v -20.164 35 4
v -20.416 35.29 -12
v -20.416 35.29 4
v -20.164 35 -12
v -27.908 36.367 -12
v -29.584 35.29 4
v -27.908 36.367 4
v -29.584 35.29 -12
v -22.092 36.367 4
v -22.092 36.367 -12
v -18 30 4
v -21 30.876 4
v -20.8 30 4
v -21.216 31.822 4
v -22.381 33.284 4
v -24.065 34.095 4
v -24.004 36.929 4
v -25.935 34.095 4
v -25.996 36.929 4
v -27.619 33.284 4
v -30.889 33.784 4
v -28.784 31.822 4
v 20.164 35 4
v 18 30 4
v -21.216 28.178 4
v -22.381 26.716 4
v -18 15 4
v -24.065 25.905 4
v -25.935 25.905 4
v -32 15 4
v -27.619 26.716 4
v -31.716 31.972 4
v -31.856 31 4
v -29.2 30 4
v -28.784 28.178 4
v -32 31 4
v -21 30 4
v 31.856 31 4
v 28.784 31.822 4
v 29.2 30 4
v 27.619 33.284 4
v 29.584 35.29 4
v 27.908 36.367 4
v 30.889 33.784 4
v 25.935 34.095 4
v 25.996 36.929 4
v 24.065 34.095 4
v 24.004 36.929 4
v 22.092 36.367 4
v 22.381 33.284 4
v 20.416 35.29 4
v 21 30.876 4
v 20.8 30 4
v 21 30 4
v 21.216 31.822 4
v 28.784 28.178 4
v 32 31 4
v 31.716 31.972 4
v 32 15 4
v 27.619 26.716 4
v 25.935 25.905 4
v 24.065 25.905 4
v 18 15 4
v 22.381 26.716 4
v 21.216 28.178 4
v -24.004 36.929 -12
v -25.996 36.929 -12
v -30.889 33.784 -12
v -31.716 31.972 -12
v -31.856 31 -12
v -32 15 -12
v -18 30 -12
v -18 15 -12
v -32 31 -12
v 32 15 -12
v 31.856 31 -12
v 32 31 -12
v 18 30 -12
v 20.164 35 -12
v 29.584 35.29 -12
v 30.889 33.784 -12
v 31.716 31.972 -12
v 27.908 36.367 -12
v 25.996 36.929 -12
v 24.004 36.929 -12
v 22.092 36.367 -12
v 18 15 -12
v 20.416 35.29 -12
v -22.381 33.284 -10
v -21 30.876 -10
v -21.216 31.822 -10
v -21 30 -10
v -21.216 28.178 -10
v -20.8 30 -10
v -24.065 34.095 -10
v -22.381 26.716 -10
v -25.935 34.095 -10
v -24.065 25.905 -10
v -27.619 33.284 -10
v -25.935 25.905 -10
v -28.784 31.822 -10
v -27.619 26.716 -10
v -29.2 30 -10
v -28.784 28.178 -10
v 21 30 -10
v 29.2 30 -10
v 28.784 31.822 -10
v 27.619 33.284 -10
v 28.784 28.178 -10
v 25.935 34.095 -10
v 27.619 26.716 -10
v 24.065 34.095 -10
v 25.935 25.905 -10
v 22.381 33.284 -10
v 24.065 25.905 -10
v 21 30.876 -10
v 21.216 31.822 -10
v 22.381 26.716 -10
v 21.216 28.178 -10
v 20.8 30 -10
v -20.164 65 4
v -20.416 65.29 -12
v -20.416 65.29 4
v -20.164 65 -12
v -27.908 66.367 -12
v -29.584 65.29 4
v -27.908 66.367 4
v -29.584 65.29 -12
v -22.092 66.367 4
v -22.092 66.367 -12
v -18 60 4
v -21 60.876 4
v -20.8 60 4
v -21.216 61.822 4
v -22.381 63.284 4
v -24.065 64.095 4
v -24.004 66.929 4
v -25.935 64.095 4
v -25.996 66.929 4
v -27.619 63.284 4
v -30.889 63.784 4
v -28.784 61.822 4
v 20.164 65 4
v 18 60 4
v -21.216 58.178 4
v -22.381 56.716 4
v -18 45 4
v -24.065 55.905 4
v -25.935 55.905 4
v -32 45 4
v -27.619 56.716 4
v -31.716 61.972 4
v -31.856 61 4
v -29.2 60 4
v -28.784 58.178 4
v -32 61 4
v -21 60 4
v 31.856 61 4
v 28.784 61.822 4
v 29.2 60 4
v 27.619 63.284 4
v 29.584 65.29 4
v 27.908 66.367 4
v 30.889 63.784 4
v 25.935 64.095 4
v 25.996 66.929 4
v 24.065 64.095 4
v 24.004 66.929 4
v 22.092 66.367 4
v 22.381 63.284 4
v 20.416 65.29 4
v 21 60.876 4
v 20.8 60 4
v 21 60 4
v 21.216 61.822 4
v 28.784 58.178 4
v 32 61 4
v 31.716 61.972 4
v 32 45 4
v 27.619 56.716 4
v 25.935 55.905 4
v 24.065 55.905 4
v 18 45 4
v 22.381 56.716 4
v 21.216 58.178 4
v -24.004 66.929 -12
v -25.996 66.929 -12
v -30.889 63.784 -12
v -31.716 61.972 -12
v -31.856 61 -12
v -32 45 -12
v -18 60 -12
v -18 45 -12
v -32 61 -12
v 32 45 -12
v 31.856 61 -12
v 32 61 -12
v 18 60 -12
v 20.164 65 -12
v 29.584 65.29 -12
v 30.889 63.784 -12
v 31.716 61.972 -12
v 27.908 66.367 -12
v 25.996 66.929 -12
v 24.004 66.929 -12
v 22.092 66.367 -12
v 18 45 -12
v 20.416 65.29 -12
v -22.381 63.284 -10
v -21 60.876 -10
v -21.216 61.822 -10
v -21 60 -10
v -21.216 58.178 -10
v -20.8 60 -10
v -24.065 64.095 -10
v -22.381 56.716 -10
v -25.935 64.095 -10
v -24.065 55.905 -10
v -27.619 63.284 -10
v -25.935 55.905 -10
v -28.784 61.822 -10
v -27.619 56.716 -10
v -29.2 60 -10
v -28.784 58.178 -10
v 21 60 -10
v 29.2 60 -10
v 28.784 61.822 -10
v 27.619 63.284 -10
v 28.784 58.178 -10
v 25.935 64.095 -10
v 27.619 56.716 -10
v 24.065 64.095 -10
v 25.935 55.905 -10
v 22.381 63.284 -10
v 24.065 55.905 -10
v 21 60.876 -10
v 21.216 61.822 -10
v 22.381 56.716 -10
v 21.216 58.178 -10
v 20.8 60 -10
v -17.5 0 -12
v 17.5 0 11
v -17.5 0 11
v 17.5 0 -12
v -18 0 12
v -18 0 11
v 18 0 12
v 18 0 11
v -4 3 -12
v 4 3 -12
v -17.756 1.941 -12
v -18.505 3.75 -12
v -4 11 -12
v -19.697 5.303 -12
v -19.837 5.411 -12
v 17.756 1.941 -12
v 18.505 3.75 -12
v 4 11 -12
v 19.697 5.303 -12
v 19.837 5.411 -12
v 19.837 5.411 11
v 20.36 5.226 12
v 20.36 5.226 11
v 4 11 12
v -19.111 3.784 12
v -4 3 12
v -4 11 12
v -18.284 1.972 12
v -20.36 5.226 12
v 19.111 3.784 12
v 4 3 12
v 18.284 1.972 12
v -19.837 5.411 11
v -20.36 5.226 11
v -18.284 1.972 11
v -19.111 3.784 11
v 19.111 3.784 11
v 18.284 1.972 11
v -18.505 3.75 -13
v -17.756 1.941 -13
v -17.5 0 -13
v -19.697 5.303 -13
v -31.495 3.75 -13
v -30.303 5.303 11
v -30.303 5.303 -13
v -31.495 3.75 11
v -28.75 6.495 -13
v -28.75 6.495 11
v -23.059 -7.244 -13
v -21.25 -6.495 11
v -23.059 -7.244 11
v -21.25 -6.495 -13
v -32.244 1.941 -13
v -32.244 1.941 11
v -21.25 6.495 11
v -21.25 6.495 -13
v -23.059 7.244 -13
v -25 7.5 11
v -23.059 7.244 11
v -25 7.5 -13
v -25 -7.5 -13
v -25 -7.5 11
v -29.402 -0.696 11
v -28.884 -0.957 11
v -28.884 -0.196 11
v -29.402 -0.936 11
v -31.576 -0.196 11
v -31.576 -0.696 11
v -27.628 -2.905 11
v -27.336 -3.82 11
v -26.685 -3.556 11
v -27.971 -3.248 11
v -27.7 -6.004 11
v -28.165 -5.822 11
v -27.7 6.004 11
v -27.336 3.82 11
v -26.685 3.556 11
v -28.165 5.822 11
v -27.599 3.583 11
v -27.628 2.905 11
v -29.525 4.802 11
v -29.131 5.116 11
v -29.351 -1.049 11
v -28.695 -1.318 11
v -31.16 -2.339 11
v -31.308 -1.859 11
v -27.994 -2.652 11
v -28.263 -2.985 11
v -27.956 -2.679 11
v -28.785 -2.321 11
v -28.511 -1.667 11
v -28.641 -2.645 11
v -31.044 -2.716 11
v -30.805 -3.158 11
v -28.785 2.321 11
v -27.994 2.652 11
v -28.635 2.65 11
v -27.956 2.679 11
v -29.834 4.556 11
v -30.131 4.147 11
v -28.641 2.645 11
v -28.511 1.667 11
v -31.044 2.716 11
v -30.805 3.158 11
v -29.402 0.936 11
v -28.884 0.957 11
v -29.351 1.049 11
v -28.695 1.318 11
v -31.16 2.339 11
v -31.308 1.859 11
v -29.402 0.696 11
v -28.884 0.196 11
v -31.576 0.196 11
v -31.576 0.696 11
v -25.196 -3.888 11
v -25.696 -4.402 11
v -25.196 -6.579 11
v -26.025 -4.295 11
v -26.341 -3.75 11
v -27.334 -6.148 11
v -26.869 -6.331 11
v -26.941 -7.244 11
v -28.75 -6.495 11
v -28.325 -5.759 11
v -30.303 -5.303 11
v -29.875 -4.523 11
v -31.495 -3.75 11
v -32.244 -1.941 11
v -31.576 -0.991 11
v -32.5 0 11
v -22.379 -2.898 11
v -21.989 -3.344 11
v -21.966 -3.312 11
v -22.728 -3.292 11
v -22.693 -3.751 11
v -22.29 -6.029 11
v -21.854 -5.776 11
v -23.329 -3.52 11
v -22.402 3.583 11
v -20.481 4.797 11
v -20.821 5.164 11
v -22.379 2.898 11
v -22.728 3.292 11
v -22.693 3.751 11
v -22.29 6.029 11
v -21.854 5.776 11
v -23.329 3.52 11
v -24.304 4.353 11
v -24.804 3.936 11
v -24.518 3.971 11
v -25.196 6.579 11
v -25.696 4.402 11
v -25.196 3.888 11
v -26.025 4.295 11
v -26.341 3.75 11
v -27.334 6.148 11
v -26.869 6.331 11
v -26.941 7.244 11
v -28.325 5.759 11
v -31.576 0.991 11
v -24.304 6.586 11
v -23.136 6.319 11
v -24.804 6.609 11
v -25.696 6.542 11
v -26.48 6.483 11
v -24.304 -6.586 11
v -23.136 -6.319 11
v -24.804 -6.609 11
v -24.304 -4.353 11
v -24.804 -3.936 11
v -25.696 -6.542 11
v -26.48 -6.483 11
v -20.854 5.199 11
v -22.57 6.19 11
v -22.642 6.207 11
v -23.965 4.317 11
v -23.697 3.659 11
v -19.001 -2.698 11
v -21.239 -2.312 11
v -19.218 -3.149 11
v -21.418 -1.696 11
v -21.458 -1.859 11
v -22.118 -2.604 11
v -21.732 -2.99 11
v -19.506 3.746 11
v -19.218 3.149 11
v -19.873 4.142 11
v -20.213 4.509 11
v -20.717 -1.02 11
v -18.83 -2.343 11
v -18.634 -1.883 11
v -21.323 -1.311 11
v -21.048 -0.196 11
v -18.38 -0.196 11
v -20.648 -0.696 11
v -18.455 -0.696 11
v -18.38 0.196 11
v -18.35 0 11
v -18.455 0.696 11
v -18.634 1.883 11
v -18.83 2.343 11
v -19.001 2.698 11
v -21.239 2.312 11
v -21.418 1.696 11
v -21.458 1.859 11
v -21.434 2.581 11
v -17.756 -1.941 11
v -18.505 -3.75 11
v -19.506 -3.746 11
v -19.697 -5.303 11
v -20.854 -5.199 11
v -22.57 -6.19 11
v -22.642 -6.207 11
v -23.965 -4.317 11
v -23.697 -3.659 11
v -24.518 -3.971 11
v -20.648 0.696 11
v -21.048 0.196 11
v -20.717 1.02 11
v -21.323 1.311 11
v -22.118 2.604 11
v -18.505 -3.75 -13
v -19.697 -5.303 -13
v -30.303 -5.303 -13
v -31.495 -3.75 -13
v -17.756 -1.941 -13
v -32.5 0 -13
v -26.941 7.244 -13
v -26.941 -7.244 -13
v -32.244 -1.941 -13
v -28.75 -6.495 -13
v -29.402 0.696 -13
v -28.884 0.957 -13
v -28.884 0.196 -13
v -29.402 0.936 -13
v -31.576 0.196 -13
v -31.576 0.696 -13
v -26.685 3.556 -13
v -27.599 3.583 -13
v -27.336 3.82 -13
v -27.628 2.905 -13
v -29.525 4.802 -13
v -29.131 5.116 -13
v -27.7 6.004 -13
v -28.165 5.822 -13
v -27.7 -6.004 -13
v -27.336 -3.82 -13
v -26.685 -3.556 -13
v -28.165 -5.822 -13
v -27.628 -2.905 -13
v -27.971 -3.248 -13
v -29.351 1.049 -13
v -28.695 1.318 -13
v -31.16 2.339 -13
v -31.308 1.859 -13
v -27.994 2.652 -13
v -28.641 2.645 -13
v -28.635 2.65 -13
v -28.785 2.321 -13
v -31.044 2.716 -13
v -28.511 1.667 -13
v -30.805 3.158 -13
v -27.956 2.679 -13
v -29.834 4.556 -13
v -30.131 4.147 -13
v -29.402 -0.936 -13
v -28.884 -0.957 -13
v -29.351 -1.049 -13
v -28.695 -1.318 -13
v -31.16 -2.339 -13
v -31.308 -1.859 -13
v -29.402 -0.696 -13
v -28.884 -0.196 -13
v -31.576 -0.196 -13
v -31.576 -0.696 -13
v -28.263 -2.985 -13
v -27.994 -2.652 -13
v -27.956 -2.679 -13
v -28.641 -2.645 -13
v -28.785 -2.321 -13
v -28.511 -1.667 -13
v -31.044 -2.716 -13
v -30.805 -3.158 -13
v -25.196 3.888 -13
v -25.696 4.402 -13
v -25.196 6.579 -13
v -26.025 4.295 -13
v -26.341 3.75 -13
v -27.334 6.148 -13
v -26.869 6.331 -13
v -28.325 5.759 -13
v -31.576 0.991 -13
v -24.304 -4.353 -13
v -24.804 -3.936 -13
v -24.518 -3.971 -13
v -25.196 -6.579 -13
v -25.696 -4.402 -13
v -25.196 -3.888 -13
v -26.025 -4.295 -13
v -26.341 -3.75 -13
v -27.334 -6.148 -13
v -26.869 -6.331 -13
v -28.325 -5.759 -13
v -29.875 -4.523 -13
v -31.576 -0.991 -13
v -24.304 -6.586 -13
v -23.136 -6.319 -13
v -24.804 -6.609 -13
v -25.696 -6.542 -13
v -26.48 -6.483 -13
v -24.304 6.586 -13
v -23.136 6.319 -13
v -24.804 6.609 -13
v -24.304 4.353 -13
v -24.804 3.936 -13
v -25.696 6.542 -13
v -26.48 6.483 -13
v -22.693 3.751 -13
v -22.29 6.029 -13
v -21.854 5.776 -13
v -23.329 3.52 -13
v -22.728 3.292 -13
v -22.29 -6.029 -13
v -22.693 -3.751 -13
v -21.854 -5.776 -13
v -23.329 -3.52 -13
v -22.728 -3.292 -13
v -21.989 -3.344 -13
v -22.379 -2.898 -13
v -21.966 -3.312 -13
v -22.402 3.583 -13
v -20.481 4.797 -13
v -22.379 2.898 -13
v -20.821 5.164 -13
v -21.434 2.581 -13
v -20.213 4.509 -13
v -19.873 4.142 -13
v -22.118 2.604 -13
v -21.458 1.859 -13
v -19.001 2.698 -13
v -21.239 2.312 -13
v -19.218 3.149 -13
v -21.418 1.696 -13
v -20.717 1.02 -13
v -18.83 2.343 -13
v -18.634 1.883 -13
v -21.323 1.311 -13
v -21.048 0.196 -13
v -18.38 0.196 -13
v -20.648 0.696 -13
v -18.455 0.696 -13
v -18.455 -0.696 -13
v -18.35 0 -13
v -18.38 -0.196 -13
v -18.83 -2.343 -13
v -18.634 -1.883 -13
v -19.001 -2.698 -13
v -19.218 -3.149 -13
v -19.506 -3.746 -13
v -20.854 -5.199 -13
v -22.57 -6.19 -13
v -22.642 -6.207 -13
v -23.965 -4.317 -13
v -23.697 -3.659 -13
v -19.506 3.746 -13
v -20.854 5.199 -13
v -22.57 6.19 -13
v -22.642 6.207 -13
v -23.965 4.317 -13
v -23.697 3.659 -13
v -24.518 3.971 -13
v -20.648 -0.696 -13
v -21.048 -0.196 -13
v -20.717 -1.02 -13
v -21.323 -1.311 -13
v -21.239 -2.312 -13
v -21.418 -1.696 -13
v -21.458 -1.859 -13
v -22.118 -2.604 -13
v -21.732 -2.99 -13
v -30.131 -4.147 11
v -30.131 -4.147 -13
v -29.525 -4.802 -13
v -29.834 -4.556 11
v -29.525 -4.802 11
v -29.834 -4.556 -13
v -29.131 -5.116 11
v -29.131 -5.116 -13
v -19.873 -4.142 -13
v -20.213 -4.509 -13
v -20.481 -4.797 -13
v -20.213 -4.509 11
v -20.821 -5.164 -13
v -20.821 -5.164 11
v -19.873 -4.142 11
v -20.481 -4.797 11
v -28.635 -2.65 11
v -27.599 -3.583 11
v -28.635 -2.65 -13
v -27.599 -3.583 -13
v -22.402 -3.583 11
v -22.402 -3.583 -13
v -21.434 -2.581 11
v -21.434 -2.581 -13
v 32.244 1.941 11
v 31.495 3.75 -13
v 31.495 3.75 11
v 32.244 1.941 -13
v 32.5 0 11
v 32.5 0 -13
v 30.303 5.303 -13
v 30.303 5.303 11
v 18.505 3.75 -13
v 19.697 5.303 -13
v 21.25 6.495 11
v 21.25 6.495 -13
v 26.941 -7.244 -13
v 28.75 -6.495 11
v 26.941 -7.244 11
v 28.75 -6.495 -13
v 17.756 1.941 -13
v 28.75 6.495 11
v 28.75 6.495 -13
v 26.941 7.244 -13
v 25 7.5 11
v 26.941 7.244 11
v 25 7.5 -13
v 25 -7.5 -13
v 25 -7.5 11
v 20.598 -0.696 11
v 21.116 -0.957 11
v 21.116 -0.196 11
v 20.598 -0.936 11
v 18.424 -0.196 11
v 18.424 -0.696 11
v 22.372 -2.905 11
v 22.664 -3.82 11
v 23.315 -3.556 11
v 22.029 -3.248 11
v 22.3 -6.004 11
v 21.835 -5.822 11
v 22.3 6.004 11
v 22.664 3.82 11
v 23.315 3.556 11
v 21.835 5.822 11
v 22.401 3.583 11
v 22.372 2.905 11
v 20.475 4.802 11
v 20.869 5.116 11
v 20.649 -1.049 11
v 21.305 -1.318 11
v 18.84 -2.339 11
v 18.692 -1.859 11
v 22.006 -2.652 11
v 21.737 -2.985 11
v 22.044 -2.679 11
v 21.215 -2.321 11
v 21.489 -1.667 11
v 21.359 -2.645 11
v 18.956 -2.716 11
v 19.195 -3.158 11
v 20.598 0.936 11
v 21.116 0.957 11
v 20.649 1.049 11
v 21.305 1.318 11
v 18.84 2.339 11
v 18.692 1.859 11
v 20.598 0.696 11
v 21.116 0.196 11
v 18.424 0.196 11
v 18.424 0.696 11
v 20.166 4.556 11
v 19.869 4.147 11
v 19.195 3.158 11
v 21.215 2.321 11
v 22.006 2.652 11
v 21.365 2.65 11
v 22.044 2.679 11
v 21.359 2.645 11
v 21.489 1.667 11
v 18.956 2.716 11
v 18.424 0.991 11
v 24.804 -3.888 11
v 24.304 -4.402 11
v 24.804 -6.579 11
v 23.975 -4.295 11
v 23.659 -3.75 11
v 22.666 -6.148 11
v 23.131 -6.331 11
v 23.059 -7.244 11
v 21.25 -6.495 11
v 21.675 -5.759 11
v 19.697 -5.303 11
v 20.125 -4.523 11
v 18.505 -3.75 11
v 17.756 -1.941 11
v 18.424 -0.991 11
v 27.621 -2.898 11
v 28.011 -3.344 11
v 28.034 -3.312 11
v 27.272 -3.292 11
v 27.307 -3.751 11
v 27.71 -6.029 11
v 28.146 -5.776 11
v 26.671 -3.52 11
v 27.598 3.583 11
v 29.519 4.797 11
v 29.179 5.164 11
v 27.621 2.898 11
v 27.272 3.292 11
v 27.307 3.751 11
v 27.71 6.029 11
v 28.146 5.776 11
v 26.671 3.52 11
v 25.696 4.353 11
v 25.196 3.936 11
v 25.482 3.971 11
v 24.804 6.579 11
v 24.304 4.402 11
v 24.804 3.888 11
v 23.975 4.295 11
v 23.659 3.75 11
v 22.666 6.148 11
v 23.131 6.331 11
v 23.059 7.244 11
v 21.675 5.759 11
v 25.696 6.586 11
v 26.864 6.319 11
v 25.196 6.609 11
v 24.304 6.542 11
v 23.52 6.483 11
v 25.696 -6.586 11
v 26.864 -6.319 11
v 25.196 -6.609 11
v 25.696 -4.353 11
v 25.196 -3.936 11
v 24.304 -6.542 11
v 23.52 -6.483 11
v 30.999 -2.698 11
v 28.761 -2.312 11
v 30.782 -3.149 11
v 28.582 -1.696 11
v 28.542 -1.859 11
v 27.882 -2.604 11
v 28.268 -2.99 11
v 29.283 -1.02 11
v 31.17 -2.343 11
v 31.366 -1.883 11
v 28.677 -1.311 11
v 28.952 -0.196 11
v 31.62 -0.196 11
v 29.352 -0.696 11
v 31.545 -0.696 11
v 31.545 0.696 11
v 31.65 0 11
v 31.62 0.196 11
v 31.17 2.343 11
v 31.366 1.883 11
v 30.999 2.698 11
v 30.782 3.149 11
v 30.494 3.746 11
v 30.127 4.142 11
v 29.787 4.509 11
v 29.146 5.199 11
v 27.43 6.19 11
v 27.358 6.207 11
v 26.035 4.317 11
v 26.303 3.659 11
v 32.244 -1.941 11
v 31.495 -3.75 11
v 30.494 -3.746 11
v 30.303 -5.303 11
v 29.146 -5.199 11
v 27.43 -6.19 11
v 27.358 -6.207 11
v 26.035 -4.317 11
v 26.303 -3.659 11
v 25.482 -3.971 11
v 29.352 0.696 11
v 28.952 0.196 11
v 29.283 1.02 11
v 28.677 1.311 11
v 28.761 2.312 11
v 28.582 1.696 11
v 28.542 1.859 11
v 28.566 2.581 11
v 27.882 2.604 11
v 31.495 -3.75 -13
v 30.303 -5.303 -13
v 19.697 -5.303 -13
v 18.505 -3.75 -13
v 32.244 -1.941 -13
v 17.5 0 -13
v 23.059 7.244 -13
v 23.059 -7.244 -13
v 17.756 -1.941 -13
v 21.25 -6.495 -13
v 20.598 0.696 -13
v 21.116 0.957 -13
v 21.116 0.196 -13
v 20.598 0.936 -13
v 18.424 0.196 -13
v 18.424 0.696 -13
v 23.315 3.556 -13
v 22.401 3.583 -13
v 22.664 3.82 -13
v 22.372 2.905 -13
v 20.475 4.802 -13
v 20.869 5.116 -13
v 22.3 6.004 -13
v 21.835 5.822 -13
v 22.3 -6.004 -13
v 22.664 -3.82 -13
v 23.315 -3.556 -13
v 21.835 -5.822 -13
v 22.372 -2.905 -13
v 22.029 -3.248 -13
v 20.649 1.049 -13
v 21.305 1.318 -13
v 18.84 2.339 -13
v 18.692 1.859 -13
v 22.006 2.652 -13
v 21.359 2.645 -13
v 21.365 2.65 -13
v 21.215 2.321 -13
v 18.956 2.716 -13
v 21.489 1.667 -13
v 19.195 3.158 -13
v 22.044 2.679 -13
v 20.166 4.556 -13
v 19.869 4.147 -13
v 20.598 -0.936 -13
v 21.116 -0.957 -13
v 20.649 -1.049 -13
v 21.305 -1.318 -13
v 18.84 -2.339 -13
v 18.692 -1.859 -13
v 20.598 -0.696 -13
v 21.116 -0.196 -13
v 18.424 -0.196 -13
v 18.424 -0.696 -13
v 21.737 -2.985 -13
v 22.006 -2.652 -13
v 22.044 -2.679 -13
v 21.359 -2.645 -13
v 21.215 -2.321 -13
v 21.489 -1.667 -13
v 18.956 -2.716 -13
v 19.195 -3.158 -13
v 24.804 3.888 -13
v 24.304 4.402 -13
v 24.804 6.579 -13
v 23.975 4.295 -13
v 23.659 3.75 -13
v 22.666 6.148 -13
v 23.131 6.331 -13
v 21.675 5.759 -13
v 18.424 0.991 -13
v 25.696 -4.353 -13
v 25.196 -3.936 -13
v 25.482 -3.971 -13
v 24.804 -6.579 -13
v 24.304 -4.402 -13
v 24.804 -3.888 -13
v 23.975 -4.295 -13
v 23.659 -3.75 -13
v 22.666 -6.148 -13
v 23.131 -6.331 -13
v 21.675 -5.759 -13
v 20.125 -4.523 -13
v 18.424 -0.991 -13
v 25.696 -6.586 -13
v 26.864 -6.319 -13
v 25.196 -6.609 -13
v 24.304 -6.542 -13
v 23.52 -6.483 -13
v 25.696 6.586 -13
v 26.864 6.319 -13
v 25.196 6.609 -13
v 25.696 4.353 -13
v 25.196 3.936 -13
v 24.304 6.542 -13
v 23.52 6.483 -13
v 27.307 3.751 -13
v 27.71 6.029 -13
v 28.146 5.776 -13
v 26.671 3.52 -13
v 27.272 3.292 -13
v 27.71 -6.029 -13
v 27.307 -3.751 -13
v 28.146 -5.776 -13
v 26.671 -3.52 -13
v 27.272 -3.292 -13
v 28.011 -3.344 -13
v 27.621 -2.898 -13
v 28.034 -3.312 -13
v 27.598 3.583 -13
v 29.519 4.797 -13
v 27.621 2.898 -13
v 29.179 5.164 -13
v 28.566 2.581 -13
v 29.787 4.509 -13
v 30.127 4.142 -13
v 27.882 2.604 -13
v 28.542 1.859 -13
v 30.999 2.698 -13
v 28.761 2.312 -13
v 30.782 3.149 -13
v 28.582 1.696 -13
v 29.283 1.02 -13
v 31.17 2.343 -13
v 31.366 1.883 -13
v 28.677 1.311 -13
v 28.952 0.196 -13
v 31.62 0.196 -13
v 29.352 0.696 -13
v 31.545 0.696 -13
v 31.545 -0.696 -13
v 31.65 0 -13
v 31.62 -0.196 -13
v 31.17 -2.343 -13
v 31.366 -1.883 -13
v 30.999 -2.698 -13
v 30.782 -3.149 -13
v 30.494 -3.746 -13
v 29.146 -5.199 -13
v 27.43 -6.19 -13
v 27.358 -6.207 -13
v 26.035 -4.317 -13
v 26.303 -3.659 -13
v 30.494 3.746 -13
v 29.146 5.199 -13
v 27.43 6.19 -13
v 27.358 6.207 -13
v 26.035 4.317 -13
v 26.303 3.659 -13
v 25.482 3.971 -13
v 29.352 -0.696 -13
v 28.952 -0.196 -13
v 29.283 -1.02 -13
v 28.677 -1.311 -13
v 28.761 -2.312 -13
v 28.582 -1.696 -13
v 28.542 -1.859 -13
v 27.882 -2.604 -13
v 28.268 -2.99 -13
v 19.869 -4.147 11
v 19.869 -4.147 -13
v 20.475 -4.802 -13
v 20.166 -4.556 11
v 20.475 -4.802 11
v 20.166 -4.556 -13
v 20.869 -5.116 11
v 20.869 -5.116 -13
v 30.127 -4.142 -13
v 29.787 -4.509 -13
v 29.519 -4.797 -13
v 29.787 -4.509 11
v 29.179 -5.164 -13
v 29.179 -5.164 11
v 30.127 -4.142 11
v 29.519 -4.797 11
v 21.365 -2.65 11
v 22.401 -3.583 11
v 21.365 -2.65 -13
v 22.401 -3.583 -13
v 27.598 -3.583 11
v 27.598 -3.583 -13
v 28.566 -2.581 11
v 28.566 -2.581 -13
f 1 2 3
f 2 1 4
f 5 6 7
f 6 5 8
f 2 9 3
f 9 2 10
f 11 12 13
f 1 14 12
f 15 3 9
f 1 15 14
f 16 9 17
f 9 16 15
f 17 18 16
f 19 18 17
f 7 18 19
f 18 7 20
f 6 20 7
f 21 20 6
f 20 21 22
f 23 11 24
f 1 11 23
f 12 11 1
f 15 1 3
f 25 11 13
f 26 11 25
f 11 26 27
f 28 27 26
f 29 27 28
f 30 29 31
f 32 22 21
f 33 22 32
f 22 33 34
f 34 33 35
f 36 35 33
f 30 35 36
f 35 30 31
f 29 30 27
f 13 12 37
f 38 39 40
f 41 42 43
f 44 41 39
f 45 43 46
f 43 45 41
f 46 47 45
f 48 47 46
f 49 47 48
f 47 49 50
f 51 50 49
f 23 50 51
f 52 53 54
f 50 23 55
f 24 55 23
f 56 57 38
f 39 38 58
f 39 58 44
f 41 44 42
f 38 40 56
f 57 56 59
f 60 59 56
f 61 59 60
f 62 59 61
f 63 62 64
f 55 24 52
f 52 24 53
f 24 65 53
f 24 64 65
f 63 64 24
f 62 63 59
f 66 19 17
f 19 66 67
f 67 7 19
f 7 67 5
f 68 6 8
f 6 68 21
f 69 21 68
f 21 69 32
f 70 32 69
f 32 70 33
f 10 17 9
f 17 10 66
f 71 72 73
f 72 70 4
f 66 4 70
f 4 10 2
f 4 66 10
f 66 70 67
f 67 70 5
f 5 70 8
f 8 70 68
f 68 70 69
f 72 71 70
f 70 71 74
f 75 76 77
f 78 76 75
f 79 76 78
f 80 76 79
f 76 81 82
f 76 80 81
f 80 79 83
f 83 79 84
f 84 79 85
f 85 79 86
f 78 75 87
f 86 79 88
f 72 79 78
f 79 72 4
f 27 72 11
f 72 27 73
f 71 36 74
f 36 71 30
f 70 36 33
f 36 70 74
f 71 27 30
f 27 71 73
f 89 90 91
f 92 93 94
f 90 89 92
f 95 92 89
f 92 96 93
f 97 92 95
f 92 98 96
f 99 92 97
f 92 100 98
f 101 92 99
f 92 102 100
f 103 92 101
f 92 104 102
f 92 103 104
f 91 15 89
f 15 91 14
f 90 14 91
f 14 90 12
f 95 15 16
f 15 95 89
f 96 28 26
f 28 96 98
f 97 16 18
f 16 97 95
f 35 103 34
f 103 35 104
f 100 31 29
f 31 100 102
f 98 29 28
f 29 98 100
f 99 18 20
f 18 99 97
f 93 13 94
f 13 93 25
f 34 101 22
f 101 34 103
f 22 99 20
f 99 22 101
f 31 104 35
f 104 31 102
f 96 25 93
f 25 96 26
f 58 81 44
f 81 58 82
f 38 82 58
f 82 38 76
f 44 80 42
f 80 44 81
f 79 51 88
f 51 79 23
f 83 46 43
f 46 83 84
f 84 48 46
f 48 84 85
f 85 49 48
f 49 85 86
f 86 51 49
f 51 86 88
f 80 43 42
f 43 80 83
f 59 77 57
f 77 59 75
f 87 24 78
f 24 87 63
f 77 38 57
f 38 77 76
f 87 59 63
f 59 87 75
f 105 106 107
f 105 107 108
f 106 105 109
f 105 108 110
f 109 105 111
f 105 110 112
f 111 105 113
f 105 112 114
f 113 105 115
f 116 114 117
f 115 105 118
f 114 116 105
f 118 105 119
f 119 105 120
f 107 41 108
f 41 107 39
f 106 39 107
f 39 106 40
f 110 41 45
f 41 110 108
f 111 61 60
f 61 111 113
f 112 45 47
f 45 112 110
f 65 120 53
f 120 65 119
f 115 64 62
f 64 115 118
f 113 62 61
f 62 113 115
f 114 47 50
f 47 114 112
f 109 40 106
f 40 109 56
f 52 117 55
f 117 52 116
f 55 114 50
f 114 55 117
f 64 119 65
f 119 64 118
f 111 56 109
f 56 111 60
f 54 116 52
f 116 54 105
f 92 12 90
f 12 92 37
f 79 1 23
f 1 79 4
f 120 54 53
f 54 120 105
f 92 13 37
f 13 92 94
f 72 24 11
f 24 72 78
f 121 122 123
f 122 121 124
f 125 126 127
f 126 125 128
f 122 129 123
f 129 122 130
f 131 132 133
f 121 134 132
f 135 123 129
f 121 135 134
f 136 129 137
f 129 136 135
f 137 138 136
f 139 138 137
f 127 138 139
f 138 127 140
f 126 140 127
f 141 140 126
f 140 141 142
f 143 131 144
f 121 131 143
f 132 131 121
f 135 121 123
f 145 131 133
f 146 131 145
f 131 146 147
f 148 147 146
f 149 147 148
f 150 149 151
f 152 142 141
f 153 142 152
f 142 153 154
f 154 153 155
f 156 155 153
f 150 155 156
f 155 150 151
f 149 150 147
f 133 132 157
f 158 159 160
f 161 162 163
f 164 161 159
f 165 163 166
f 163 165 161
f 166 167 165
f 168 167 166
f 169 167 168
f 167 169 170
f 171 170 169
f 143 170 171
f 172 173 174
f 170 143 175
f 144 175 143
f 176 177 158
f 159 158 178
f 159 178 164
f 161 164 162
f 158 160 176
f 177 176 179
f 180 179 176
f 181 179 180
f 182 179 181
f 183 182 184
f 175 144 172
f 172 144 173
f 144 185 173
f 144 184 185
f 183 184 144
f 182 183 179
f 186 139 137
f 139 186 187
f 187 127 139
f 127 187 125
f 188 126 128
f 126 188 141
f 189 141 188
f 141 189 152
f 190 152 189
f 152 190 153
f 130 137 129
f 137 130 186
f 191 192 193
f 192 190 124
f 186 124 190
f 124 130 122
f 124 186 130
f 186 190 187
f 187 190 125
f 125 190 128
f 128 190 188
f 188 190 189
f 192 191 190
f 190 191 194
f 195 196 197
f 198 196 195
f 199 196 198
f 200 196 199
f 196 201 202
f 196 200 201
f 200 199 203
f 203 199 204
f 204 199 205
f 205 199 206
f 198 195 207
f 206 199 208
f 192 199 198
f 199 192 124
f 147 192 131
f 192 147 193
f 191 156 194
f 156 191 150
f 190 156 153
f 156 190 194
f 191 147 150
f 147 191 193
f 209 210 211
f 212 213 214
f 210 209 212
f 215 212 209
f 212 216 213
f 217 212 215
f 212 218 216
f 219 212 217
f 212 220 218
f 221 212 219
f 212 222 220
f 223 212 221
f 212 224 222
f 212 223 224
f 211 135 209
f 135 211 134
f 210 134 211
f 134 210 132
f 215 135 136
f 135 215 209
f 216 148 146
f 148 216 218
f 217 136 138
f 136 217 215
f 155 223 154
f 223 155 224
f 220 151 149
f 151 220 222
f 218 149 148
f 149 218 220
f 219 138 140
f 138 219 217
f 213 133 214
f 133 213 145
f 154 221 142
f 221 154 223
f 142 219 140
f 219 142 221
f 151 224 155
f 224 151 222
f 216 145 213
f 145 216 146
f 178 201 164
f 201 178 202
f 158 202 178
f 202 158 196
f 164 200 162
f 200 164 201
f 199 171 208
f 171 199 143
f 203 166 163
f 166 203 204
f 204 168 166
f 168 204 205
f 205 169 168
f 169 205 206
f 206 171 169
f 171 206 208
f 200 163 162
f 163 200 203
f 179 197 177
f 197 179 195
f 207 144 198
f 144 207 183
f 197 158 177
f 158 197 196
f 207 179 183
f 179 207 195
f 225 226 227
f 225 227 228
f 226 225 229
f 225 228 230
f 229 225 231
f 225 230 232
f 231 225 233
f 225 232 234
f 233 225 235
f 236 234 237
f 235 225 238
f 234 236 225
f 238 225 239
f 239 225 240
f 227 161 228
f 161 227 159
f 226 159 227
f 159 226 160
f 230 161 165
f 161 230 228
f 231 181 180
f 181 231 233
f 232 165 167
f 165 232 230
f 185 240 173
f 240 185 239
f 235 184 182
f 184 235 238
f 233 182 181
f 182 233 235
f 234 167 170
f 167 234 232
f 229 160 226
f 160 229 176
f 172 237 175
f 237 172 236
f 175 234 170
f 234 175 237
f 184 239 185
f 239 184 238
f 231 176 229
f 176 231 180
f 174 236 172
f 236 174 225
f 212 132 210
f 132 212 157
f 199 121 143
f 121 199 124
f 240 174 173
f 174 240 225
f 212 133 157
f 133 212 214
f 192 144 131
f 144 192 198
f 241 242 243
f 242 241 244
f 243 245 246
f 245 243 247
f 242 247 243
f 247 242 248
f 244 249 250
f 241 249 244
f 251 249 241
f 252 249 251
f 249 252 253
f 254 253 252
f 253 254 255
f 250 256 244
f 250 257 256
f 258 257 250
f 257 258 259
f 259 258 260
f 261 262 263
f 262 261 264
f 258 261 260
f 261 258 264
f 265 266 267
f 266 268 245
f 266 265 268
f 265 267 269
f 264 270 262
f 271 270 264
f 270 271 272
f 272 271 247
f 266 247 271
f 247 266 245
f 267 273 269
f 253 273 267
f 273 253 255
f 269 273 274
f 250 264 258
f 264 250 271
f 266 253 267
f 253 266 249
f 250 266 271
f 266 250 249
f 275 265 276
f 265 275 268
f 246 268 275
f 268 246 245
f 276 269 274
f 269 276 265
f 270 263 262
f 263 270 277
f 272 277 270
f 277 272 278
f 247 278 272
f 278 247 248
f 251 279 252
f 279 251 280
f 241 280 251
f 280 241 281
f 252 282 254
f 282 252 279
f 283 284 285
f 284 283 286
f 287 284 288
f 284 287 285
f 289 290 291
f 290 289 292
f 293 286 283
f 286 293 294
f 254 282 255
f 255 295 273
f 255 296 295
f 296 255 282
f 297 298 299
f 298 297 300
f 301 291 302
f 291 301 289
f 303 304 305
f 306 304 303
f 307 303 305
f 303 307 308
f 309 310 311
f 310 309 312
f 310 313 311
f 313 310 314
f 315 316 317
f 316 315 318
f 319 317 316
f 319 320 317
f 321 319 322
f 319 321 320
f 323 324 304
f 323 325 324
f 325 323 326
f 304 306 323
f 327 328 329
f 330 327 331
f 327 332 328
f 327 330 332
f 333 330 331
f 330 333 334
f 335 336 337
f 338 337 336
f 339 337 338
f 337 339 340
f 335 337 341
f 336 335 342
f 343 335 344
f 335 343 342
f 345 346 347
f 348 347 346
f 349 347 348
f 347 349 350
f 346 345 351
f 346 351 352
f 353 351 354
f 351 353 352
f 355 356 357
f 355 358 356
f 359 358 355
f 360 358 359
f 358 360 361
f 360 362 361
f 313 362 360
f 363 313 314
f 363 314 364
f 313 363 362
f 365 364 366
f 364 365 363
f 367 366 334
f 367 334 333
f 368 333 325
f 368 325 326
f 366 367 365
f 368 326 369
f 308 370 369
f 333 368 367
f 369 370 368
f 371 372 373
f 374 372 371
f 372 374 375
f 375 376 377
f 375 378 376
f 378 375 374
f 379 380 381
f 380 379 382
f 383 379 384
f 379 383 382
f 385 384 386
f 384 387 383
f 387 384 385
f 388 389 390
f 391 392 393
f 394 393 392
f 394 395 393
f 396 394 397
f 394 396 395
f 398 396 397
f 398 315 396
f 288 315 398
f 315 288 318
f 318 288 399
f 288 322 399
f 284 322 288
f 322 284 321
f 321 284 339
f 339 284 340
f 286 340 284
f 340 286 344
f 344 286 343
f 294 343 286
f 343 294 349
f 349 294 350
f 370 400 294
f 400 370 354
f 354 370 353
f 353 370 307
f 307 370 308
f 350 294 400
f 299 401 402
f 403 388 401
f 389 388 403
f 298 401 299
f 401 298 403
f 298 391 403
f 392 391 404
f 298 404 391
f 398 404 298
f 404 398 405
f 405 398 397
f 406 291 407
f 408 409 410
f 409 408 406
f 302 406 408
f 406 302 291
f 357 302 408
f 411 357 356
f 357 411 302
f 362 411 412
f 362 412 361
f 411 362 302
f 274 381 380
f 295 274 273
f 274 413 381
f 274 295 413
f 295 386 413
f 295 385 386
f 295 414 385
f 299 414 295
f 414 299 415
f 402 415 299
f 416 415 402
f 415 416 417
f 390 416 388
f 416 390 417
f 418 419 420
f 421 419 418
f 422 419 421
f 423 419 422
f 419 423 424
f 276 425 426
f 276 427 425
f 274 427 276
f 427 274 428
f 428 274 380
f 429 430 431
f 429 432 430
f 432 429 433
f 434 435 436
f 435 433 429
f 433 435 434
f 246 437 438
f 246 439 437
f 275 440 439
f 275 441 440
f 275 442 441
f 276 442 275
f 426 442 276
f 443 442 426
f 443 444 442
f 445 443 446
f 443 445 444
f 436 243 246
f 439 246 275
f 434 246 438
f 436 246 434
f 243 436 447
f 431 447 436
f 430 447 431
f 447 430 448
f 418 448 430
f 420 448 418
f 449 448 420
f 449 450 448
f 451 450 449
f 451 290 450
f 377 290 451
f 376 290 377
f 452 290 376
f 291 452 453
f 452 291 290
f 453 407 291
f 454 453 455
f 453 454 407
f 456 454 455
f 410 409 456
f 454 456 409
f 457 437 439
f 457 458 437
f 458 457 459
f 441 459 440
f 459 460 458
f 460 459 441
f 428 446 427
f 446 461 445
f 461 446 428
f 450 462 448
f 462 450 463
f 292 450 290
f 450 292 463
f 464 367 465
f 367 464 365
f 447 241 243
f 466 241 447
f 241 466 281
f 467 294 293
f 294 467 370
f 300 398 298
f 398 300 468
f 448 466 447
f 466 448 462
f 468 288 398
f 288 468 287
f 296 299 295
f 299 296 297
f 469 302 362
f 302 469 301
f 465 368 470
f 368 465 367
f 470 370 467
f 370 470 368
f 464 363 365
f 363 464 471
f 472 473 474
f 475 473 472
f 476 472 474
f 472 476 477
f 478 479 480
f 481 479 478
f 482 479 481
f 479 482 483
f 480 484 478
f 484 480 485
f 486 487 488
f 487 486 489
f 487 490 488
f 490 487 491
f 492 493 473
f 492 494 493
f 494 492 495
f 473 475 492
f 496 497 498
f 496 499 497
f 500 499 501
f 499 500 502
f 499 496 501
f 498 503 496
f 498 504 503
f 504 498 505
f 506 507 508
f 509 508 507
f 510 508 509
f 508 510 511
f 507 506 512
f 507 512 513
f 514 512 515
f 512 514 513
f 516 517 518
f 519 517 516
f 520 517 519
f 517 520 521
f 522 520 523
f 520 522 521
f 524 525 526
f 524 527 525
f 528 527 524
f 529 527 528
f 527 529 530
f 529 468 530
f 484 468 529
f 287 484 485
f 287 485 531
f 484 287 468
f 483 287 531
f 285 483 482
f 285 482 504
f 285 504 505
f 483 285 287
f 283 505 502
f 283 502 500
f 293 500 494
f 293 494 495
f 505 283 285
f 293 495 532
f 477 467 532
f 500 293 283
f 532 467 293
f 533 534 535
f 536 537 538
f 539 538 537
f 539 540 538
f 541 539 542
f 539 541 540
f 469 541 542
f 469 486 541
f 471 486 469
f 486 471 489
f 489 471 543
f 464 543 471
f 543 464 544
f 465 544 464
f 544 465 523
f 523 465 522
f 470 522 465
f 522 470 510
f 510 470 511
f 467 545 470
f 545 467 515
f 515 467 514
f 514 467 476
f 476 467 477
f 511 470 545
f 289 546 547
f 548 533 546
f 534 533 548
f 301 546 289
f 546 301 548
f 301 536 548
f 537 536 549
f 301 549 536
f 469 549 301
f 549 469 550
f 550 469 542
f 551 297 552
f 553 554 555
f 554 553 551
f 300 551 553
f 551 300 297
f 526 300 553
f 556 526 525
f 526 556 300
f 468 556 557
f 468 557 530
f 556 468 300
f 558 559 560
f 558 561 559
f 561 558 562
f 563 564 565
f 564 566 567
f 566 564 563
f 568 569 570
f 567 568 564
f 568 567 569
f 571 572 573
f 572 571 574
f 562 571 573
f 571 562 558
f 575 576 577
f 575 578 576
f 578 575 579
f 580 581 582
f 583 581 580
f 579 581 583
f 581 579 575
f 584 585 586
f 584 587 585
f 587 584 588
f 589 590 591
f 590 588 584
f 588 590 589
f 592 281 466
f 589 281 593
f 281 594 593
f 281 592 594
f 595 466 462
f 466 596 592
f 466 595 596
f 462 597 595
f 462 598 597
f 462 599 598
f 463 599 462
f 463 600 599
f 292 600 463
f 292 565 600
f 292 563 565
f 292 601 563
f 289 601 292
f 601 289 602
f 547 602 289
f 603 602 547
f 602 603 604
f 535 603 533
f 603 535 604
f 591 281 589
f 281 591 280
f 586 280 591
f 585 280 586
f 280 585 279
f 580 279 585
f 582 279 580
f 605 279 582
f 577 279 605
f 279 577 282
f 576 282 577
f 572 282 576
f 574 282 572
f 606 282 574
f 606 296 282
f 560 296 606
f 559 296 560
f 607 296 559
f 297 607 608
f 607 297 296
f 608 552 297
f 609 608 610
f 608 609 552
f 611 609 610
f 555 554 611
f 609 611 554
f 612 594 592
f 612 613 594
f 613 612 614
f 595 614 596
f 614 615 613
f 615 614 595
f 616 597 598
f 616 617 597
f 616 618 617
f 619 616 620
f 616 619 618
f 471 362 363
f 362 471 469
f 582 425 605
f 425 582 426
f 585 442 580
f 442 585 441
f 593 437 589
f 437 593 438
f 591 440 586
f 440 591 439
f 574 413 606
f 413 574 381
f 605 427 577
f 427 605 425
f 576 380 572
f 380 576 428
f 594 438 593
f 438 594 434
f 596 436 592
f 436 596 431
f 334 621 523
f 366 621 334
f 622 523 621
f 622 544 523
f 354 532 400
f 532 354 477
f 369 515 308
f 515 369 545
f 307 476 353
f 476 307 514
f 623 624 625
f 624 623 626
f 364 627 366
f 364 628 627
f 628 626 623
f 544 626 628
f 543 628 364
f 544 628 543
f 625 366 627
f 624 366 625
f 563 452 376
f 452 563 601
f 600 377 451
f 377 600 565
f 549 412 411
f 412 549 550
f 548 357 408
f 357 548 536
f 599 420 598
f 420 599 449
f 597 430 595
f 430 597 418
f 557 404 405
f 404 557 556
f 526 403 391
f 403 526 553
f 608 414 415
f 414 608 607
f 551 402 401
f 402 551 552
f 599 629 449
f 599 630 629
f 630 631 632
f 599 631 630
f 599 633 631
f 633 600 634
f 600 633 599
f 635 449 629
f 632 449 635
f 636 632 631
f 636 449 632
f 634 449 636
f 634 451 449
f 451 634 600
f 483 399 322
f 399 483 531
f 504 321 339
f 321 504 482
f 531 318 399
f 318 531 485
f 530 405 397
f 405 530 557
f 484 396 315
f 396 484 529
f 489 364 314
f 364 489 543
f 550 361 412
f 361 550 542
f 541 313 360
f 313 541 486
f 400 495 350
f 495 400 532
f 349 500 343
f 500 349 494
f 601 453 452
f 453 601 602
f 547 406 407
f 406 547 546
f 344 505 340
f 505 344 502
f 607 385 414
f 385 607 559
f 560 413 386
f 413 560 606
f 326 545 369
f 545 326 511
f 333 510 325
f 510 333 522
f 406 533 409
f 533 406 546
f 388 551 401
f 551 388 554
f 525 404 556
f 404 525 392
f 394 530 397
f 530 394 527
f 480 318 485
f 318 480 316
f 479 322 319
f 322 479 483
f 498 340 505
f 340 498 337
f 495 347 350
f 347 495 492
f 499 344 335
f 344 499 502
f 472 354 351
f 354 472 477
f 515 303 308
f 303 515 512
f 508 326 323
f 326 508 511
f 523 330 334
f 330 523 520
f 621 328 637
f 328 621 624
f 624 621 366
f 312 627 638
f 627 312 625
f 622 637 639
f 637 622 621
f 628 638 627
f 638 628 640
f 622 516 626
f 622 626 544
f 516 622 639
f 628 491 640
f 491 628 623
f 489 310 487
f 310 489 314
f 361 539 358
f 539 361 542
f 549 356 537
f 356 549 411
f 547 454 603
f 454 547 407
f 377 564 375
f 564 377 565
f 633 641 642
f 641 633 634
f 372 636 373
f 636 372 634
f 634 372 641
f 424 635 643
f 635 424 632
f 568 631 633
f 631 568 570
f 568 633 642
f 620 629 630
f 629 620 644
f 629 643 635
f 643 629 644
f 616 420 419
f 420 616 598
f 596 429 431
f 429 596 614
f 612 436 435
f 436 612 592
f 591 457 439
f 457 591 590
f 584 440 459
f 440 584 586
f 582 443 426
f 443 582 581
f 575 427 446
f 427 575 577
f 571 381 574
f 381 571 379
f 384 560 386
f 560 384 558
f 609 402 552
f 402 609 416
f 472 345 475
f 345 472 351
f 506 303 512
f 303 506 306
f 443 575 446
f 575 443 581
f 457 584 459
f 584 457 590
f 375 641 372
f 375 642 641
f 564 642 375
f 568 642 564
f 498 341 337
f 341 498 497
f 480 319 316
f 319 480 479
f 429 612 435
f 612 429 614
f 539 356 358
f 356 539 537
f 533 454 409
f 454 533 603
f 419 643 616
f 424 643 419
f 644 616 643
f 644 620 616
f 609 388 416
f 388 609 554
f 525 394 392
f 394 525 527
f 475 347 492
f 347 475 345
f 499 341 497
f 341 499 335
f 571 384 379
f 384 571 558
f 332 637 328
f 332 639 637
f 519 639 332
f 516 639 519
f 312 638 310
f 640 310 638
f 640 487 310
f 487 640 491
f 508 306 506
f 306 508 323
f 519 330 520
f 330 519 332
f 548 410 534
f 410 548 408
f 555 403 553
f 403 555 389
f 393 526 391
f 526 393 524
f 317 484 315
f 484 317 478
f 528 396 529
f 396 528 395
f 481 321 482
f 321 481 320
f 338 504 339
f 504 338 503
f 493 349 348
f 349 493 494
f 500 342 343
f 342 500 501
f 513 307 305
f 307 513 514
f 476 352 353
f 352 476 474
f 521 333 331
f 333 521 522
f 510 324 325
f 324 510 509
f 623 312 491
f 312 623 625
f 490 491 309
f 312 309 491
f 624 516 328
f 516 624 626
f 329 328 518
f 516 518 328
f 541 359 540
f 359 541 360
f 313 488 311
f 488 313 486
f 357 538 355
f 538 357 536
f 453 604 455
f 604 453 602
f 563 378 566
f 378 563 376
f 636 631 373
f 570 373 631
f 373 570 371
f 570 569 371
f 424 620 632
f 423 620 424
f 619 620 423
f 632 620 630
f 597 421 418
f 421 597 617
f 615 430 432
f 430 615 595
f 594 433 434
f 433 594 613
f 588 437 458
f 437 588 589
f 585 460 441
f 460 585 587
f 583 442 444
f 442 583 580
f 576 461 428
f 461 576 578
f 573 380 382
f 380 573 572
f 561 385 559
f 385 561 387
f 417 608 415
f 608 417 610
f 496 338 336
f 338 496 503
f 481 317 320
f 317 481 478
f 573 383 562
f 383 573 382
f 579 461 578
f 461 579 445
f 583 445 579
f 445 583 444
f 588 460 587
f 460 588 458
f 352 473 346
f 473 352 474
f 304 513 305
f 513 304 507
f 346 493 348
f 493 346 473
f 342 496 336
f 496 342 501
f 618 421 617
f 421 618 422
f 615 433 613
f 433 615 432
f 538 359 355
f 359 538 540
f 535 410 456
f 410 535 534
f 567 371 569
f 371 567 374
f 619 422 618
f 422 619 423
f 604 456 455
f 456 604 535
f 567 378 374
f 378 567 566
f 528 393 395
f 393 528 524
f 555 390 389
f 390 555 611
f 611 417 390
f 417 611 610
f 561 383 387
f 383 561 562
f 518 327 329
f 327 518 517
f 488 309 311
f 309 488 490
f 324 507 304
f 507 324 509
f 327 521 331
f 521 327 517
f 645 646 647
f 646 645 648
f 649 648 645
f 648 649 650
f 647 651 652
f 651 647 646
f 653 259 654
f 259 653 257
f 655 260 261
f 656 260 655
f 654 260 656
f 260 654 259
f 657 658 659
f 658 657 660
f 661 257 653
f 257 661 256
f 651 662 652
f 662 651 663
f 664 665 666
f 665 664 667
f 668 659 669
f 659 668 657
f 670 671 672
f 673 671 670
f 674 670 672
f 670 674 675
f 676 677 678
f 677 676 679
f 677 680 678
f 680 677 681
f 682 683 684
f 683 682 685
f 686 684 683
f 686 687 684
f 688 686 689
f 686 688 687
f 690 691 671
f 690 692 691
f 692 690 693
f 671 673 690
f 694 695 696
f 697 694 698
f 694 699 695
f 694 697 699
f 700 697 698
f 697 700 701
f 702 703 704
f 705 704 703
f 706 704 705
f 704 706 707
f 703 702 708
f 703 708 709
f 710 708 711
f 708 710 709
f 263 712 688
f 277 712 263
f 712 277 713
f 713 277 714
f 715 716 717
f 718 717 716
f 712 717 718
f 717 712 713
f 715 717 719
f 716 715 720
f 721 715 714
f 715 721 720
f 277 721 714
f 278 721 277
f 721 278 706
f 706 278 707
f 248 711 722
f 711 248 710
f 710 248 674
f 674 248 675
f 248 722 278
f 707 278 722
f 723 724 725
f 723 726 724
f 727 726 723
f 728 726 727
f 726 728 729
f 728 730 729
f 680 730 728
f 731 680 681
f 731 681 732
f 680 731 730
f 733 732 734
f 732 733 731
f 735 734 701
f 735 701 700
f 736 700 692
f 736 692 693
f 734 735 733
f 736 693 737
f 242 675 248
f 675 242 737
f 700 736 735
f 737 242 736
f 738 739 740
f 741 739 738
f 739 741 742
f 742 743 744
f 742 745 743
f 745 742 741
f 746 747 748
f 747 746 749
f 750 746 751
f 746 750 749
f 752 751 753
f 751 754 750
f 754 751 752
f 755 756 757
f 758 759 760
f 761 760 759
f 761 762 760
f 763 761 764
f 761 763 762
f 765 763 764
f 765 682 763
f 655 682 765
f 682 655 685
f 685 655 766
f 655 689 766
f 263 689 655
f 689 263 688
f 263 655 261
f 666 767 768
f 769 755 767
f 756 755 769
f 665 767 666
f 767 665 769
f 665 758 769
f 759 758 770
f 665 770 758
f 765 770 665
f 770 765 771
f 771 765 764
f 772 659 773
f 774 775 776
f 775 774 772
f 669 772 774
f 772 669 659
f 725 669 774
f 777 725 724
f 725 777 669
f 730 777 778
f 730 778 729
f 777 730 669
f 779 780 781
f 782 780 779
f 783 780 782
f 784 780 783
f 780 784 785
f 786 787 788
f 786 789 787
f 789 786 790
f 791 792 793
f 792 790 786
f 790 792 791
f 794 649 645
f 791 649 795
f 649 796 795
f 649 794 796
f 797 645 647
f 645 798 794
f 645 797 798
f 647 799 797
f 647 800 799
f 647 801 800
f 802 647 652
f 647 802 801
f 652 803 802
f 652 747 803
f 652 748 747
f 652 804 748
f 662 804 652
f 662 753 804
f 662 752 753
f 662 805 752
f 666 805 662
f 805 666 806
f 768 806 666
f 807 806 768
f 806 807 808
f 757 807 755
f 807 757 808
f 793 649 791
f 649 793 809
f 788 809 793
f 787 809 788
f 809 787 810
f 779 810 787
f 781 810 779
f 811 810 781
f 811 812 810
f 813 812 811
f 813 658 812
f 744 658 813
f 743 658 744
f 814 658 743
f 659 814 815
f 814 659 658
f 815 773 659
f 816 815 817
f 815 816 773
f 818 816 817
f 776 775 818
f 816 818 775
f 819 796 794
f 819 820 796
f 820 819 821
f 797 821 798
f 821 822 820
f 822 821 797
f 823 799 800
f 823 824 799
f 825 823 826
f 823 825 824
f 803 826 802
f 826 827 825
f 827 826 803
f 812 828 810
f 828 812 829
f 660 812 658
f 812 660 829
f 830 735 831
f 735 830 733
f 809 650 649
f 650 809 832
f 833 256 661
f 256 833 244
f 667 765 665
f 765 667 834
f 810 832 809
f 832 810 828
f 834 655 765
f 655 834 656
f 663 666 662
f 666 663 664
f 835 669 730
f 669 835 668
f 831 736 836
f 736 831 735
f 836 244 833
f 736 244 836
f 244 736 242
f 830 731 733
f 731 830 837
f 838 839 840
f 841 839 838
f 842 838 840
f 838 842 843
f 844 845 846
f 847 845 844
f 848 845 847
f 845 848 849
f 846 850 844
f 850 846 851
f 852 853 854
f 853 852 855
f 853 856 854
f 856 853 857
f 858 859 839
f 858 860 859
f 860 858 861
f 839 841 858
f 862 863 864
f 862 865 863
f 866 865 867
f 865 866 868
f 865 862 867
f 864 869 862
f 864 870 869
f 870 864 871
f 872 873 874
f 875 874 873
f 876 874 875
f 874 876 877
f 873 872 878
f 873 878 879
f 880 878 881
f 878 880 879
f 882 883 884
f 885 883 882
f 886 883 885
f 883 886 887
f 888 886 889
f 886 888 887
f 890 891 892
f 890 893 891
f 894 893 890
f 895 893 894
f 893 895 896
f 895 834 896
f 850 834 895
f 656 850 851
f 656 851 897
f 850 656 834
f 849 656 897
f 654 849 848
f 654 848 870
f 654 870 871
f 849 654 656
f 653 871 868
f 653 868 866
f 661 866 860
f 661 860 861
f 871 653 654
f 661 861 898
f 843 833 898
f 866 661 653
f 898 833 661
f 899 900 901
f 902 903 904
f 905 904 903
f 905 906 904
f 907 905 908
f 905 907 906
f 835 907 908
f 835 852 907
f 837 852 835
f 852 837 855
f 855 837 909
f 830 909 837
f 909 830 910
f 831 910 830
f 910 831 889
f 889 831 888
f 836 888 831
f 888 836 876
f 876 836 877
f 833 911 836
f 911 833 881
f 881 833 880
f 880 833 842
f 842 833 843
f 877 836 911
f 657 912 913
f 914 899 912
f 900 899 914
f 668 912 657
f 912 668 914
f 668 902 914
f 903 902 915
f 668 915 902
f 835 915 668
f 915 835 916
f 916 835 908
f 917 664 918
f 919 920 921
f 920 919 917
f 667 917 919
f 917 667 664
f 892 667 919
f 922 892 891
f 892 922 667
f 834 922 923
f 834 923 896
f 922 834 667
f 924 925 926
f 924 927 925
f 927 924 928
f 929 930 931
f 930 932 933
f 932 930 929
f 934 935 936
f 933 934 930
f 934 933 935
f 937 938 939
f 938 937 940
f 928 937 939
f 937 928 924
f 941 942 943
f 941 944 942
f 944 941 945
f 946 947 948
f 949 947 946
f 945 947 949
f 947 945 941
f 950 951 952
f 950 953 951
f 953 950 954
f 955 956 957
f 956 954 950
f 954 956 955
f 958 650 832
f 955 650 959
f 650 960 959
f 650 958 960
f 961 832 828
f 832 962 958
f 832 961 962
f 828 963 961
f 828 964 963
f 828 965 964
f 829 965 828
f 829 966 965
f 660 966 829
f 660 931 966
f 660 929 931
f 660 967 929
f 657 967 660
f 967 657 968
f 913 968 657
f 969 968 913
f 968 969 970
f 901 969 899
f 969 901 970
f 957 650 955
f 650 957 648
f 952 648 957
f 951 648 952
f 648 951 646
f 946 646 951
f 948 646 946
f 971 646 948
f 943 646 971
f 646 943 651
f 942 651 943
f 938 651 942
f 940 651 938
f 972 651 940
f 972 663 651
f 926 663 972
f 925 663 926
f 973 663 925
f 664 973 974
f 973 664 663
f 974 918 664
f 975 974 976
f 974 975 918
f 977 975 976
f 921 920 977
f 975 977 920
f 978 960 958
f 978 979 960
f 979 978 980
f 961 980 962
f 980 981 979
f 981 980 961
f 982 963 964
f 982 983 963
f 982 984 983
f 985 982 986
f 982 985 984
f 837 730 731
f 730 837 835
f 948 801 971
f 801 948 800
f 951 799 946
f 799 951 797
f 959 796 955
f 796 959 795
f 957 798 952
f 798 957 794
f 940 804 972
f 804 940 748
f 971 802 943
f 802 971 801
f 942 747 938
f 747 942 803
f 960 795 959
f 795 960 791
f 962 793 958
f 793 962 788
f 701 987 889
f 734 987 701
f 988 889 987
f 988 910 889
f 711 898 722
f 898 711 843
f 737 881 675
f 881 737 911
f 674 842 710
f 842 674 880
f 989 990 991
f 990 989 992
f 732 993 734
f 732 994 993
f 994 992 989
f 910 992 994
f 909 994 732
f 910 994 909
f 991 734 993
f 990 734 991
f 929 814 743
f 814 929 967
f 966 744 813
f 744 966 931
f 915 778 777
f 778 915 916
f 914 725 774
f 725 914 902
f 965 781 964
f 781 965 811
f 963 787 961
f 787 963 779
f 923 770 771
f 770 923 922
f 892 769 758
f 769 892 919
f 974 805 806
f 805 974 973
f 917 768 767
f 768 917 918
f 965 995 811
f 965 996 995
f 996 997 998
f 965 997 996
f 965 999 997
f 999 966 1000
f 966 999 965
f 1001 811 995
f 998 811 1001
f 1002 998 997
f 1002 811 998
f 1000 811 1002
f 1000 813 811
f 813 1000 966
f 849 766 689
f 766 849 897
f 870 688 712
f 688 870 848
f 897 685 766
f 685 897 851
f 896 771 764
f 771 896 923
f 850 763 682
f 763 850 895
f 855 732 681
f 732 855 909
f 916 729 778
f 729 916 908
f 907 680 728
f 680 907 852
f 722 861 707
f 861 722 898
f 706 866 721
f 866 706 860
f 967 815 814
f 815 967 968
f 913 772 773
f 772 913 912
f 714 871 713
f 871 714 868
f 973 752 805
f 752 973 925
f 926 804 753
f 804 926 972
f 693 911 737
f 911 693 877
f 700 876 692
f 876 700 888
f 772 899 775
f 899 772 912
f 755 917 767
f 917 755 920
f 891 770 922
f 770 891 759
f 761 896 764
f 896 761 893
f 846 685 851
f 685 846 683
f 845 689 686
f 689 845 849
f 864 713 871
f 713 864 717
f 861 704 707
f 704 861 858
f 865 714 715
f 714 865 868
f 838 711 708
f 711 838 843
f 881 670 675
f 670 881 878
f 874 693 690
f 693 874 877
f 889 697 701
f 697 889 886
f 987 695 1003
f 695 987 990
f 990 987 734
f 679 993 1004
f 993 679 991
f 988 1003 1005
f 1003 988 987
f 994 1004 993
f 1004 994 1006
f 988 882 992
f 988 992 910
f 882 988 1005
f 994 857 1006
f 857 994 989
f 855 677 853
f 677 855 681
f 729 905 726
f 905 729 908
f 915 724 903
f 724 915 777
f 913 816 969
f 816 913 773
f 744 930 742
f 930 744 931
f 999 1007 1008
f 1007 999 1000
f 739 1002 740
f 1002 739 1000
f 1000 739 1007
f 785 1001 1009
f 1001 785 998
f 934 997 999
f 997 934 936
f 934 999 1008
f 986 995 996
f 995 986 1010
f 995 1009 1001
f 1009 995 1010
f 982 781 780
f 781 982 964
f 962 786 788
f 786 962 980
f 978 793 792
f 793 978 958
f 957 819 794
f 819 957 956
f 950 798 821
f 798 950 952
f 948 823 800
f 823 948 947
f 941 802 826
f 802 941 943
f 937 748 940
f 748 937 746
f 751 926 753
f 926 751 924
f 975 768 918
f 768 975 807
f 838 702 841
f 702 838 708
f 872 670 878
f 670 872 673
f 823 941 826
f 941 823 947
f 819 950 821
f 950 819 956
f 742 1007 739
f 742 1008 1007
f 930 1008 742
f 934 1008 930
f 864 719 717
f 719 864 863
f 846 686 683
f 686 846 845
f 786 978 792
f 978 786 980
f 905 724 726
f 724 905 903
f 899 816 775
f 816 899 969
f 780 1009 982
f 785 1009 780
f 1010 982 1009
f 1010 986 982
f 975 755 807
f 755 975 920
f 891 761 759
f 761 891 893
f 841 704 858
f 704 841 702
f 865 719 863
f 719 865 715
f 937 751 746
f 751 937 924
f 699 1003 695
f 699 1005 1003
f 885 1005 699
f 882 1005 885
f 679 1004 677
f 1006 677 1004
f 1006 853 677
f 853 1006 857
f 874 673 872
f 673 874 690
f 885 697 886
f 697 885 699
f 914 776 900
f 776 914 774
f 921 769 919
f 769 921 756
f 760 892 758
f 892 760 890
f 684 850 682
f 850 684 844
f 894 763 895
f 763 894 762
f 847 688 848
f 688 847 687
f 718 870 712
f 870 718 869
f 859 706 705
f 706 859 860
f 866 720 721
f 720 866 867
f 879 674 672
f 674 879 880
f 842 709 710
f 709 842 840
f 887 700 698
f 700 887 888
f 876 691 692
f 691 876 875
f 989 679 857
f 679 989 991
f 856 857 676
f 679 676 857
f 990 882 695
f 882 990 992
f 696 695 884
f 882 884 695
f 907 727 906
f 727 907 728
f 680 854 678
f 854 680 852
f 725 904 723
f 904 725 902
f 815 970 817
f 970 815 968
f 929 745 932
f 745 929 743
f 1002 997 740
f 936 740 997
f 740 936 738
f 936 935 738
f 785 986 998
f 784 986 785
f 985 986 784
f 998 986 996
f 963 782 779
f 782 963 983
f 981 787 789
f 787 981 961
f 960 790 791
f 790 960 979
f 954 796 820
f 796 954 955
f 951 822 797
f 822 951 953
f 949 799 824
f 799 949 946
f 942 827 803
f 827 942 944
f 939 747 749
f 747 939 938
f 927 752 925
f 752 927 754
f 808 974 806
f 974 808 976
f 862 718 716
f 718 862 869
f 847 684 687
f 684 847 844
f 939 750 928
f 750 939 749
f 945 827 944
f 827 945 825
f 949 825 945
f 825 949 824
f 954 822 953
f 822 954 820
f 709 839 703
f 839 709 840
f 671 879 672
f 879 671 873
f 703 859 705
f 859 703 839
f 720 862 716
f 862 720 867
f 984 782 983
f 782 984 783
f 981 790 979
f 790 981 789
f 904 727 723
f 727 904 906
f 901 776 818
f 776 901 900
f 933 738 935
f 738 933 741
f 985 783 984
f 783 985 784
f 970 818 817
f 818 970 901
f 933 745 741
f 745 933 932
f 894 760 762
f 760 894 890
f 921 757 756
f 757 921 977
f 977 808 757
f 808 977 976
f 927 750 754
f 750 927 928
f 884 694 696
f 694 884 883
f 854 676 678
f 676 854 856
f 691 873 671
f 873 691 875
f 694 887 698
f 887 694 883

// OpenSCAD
//SLIDE | Smart phone_q Slider by isaac budmen @ibudmen
// preview[view:south west, tilt:top diagonal]

// What kind of Smartphone do you have?
type_of_phone = "first"; // [first:iPhone5,second:HTC One X,third:Samsung Galaxy S3,fourth:Lumia 920,fifth:Nexus 4,sixth:Samsung Galaxy Note 2,seventh:Motorola Droid X,eighth:Motorola Droid RazrHD,nineth:Blackberry Bold 9900,tenth:LG Optimus G,eleventh:iPhone4/4s]

// Add end caps to build plate?
print_endcaps = "Yes"; // [Yes,No]

end_vis();

//ENDS

module end(){
union(){
translate([-21,20,-12])cube([42,5,16]);
difference(){
union(){
translate([-25,20,-12])cylinder(16,7,7);
translate([-32,5,-12])cube([14,16,16]);
}
translate([-25,20,-10])cylinder(18,4.2,4.2);
}
difference(){
union(){translate([25,20,-12])cylinder(16,7,7);
translate([18,5,-12])cube([14,16,16]);}
translate([25,20,-10])cylinder(18,4.2,4.2);
}

}};

module end_vis() {
if (print_endcaps == "Yes") {
translate([0,10,0])end();
translate([0,40,0])end();
}
else if (print_endcaps == "No"){
cube([1,1,1]);
}
};

//MAIN

module main(){
difference(){
hull(){
translate([-21,0,0])cube([42,5,24]);
translate([-4,2,0])cube([8,9,24]);
}
translate([0,10,11])phone_type();
translate([-25,0,-1])cylinder(26,7,7);
translate([25,0,-1])cylinder(26,7,7);
};};

module phone_type(){
	if (type_of_phone == "first") {
		cube([8,14,28], center=true);
	} else if (type_of_phone == "second") {
		cube([9.0,14,28], center=true);
	} else if (type_of_phone== "third") {
		cube([8.7,14,28], center=true);
	} else if (type_of_phone == "fourth") {
		cube([10.8,14,28], center=true);
	} else if (type_of_phone == "fifth") {
		cube([9.2,14,28], center=true);
	} else if (type_of_phone == "sixth") {
		cube([9.5,14,28], center=true);
	} else if (type_of_phone == "seventh") {
		cube([10,14,28], center=true);
	} else if (type_of_phone == "eighth") {
		cube([8.5,14,28], center=true);
	} else if (type_of_phone == "nineth") {
		cube([10.6,14,28], center=true);
	} else if (type_of_phone == "tenth") {
		cube([8.6,14,28], center=true);
	} else if (type_of_phone == "eleventh") {
		cube([9.4,14,28], center=true);
	} 
};


union(){
translate([0,0,-12])main();}

	translate([-25,0,-1])TLB_linearBearing(
							inner_d          = 8, 
							outer_d          = 15,
							h                = 24,
							stringWidth      = 0.5,
							minWallThickness = 0.85, 
							tooths           = 16, 
							toothRatio       = 0.25);

	translate([25,0,-1])TLB_linearBearing(
							inner_d          = 8, 
							outer_d          = 15,
							h                = 24,
							stringWidth      = 0.5,
							minWallThickness = 0.85, 
							tooths           = 16, 
							toothRatio       = 0.25);







// LINEAR BEARING CODE by Krallinger Sebastian
// ************* units.scad ************* //
mm = 1;
cm = 10 * mm;
dm = 100 * mm;
m = 1000 * mm;

inch = 25.4 * mm;

X = [1, 0, 0];
Y = [0, 1, 0];
Z = [0, 0, 1];

M3 = 3*mm;
M4 = 4*mm;
M5 = 5*mm;
M6 = 6*mm;
M8 = 8*mm;



epsilon = 0.01*mm;
OS = epsilon;

// ************* toothedLinearBearing.scad ************* //


/**
* @brief Toothed Linear Bearing (TLB).
*
* Linear Bearing with parallel triagnles towards the center.
* @param inner_d Inner diameter (Axis Diameter)
* @param outer_d outer diameter (holder Diameter)
* @param h height
* @param stringWidth width of an single string of your printer (this defines the width of the tooth walls)
* @param minWallThickness minimum thickness of the outer wall.
* @param tooths number of toohts on the innside
* @param toothRatio coverd length of the inner ring
**/
module TLB_linearBearing(
inner_d = 8,
outer_d = 15,
h = 24,
stringWidth = 0.5,
minWallThickness = 0.85,
tooths = 16,
toothRatio = 0.25
) {

stringWidth = stringWidth; //!< the layer width of one string

TLB_innerD = inner_d;
TLB_outerD = outer_d;
TLB_minWallThickness = minWallThickness;
TLB_h = h;
TLB_tooths = tooths;

TLB_toothRate = toothRatio;


gapWidth = (TLB_innerD*PI)/TLB_tooths *TLB_toothRate;
//echo(str("gap Width: ", gapWidth));
middR = TLB_outerD/2- TLB_minWallThickness;

//outer ring
difference() {
cylinder(r=TLB_outerD/2, h=TLB_h, center=true);
cylinder(r=middR, h=TLB_h+2*OS, center=true);
}


difference() {
union(){
cylinder(r=TLB_innerD/2 + stringWidth, h=TLB_h, center=true);

for (i=[0:360 / TLB_tooths : 360]) {
rotate(a=i,v=Z) translate([-(gapWidth+2*stringWidth)/2, 0, -TLB_h/2])
cube(size=[gapWidth+2*stringWidth, middR+OS, TLB_h], center=false);
}
}
union(){
cylinder(r=TLB_innerD/2, h=TLB_h+2*OS, center=true);

for (i=[0:360 / TLB_tooths : 360]) {
rotate(a=i,v=Z) translate([-gapWidth/2, 0, -TLB_h/2-OS])
cube(size=[gapWidth, middR, TLB_h+2*OS], center=false);
}
}
}

};
